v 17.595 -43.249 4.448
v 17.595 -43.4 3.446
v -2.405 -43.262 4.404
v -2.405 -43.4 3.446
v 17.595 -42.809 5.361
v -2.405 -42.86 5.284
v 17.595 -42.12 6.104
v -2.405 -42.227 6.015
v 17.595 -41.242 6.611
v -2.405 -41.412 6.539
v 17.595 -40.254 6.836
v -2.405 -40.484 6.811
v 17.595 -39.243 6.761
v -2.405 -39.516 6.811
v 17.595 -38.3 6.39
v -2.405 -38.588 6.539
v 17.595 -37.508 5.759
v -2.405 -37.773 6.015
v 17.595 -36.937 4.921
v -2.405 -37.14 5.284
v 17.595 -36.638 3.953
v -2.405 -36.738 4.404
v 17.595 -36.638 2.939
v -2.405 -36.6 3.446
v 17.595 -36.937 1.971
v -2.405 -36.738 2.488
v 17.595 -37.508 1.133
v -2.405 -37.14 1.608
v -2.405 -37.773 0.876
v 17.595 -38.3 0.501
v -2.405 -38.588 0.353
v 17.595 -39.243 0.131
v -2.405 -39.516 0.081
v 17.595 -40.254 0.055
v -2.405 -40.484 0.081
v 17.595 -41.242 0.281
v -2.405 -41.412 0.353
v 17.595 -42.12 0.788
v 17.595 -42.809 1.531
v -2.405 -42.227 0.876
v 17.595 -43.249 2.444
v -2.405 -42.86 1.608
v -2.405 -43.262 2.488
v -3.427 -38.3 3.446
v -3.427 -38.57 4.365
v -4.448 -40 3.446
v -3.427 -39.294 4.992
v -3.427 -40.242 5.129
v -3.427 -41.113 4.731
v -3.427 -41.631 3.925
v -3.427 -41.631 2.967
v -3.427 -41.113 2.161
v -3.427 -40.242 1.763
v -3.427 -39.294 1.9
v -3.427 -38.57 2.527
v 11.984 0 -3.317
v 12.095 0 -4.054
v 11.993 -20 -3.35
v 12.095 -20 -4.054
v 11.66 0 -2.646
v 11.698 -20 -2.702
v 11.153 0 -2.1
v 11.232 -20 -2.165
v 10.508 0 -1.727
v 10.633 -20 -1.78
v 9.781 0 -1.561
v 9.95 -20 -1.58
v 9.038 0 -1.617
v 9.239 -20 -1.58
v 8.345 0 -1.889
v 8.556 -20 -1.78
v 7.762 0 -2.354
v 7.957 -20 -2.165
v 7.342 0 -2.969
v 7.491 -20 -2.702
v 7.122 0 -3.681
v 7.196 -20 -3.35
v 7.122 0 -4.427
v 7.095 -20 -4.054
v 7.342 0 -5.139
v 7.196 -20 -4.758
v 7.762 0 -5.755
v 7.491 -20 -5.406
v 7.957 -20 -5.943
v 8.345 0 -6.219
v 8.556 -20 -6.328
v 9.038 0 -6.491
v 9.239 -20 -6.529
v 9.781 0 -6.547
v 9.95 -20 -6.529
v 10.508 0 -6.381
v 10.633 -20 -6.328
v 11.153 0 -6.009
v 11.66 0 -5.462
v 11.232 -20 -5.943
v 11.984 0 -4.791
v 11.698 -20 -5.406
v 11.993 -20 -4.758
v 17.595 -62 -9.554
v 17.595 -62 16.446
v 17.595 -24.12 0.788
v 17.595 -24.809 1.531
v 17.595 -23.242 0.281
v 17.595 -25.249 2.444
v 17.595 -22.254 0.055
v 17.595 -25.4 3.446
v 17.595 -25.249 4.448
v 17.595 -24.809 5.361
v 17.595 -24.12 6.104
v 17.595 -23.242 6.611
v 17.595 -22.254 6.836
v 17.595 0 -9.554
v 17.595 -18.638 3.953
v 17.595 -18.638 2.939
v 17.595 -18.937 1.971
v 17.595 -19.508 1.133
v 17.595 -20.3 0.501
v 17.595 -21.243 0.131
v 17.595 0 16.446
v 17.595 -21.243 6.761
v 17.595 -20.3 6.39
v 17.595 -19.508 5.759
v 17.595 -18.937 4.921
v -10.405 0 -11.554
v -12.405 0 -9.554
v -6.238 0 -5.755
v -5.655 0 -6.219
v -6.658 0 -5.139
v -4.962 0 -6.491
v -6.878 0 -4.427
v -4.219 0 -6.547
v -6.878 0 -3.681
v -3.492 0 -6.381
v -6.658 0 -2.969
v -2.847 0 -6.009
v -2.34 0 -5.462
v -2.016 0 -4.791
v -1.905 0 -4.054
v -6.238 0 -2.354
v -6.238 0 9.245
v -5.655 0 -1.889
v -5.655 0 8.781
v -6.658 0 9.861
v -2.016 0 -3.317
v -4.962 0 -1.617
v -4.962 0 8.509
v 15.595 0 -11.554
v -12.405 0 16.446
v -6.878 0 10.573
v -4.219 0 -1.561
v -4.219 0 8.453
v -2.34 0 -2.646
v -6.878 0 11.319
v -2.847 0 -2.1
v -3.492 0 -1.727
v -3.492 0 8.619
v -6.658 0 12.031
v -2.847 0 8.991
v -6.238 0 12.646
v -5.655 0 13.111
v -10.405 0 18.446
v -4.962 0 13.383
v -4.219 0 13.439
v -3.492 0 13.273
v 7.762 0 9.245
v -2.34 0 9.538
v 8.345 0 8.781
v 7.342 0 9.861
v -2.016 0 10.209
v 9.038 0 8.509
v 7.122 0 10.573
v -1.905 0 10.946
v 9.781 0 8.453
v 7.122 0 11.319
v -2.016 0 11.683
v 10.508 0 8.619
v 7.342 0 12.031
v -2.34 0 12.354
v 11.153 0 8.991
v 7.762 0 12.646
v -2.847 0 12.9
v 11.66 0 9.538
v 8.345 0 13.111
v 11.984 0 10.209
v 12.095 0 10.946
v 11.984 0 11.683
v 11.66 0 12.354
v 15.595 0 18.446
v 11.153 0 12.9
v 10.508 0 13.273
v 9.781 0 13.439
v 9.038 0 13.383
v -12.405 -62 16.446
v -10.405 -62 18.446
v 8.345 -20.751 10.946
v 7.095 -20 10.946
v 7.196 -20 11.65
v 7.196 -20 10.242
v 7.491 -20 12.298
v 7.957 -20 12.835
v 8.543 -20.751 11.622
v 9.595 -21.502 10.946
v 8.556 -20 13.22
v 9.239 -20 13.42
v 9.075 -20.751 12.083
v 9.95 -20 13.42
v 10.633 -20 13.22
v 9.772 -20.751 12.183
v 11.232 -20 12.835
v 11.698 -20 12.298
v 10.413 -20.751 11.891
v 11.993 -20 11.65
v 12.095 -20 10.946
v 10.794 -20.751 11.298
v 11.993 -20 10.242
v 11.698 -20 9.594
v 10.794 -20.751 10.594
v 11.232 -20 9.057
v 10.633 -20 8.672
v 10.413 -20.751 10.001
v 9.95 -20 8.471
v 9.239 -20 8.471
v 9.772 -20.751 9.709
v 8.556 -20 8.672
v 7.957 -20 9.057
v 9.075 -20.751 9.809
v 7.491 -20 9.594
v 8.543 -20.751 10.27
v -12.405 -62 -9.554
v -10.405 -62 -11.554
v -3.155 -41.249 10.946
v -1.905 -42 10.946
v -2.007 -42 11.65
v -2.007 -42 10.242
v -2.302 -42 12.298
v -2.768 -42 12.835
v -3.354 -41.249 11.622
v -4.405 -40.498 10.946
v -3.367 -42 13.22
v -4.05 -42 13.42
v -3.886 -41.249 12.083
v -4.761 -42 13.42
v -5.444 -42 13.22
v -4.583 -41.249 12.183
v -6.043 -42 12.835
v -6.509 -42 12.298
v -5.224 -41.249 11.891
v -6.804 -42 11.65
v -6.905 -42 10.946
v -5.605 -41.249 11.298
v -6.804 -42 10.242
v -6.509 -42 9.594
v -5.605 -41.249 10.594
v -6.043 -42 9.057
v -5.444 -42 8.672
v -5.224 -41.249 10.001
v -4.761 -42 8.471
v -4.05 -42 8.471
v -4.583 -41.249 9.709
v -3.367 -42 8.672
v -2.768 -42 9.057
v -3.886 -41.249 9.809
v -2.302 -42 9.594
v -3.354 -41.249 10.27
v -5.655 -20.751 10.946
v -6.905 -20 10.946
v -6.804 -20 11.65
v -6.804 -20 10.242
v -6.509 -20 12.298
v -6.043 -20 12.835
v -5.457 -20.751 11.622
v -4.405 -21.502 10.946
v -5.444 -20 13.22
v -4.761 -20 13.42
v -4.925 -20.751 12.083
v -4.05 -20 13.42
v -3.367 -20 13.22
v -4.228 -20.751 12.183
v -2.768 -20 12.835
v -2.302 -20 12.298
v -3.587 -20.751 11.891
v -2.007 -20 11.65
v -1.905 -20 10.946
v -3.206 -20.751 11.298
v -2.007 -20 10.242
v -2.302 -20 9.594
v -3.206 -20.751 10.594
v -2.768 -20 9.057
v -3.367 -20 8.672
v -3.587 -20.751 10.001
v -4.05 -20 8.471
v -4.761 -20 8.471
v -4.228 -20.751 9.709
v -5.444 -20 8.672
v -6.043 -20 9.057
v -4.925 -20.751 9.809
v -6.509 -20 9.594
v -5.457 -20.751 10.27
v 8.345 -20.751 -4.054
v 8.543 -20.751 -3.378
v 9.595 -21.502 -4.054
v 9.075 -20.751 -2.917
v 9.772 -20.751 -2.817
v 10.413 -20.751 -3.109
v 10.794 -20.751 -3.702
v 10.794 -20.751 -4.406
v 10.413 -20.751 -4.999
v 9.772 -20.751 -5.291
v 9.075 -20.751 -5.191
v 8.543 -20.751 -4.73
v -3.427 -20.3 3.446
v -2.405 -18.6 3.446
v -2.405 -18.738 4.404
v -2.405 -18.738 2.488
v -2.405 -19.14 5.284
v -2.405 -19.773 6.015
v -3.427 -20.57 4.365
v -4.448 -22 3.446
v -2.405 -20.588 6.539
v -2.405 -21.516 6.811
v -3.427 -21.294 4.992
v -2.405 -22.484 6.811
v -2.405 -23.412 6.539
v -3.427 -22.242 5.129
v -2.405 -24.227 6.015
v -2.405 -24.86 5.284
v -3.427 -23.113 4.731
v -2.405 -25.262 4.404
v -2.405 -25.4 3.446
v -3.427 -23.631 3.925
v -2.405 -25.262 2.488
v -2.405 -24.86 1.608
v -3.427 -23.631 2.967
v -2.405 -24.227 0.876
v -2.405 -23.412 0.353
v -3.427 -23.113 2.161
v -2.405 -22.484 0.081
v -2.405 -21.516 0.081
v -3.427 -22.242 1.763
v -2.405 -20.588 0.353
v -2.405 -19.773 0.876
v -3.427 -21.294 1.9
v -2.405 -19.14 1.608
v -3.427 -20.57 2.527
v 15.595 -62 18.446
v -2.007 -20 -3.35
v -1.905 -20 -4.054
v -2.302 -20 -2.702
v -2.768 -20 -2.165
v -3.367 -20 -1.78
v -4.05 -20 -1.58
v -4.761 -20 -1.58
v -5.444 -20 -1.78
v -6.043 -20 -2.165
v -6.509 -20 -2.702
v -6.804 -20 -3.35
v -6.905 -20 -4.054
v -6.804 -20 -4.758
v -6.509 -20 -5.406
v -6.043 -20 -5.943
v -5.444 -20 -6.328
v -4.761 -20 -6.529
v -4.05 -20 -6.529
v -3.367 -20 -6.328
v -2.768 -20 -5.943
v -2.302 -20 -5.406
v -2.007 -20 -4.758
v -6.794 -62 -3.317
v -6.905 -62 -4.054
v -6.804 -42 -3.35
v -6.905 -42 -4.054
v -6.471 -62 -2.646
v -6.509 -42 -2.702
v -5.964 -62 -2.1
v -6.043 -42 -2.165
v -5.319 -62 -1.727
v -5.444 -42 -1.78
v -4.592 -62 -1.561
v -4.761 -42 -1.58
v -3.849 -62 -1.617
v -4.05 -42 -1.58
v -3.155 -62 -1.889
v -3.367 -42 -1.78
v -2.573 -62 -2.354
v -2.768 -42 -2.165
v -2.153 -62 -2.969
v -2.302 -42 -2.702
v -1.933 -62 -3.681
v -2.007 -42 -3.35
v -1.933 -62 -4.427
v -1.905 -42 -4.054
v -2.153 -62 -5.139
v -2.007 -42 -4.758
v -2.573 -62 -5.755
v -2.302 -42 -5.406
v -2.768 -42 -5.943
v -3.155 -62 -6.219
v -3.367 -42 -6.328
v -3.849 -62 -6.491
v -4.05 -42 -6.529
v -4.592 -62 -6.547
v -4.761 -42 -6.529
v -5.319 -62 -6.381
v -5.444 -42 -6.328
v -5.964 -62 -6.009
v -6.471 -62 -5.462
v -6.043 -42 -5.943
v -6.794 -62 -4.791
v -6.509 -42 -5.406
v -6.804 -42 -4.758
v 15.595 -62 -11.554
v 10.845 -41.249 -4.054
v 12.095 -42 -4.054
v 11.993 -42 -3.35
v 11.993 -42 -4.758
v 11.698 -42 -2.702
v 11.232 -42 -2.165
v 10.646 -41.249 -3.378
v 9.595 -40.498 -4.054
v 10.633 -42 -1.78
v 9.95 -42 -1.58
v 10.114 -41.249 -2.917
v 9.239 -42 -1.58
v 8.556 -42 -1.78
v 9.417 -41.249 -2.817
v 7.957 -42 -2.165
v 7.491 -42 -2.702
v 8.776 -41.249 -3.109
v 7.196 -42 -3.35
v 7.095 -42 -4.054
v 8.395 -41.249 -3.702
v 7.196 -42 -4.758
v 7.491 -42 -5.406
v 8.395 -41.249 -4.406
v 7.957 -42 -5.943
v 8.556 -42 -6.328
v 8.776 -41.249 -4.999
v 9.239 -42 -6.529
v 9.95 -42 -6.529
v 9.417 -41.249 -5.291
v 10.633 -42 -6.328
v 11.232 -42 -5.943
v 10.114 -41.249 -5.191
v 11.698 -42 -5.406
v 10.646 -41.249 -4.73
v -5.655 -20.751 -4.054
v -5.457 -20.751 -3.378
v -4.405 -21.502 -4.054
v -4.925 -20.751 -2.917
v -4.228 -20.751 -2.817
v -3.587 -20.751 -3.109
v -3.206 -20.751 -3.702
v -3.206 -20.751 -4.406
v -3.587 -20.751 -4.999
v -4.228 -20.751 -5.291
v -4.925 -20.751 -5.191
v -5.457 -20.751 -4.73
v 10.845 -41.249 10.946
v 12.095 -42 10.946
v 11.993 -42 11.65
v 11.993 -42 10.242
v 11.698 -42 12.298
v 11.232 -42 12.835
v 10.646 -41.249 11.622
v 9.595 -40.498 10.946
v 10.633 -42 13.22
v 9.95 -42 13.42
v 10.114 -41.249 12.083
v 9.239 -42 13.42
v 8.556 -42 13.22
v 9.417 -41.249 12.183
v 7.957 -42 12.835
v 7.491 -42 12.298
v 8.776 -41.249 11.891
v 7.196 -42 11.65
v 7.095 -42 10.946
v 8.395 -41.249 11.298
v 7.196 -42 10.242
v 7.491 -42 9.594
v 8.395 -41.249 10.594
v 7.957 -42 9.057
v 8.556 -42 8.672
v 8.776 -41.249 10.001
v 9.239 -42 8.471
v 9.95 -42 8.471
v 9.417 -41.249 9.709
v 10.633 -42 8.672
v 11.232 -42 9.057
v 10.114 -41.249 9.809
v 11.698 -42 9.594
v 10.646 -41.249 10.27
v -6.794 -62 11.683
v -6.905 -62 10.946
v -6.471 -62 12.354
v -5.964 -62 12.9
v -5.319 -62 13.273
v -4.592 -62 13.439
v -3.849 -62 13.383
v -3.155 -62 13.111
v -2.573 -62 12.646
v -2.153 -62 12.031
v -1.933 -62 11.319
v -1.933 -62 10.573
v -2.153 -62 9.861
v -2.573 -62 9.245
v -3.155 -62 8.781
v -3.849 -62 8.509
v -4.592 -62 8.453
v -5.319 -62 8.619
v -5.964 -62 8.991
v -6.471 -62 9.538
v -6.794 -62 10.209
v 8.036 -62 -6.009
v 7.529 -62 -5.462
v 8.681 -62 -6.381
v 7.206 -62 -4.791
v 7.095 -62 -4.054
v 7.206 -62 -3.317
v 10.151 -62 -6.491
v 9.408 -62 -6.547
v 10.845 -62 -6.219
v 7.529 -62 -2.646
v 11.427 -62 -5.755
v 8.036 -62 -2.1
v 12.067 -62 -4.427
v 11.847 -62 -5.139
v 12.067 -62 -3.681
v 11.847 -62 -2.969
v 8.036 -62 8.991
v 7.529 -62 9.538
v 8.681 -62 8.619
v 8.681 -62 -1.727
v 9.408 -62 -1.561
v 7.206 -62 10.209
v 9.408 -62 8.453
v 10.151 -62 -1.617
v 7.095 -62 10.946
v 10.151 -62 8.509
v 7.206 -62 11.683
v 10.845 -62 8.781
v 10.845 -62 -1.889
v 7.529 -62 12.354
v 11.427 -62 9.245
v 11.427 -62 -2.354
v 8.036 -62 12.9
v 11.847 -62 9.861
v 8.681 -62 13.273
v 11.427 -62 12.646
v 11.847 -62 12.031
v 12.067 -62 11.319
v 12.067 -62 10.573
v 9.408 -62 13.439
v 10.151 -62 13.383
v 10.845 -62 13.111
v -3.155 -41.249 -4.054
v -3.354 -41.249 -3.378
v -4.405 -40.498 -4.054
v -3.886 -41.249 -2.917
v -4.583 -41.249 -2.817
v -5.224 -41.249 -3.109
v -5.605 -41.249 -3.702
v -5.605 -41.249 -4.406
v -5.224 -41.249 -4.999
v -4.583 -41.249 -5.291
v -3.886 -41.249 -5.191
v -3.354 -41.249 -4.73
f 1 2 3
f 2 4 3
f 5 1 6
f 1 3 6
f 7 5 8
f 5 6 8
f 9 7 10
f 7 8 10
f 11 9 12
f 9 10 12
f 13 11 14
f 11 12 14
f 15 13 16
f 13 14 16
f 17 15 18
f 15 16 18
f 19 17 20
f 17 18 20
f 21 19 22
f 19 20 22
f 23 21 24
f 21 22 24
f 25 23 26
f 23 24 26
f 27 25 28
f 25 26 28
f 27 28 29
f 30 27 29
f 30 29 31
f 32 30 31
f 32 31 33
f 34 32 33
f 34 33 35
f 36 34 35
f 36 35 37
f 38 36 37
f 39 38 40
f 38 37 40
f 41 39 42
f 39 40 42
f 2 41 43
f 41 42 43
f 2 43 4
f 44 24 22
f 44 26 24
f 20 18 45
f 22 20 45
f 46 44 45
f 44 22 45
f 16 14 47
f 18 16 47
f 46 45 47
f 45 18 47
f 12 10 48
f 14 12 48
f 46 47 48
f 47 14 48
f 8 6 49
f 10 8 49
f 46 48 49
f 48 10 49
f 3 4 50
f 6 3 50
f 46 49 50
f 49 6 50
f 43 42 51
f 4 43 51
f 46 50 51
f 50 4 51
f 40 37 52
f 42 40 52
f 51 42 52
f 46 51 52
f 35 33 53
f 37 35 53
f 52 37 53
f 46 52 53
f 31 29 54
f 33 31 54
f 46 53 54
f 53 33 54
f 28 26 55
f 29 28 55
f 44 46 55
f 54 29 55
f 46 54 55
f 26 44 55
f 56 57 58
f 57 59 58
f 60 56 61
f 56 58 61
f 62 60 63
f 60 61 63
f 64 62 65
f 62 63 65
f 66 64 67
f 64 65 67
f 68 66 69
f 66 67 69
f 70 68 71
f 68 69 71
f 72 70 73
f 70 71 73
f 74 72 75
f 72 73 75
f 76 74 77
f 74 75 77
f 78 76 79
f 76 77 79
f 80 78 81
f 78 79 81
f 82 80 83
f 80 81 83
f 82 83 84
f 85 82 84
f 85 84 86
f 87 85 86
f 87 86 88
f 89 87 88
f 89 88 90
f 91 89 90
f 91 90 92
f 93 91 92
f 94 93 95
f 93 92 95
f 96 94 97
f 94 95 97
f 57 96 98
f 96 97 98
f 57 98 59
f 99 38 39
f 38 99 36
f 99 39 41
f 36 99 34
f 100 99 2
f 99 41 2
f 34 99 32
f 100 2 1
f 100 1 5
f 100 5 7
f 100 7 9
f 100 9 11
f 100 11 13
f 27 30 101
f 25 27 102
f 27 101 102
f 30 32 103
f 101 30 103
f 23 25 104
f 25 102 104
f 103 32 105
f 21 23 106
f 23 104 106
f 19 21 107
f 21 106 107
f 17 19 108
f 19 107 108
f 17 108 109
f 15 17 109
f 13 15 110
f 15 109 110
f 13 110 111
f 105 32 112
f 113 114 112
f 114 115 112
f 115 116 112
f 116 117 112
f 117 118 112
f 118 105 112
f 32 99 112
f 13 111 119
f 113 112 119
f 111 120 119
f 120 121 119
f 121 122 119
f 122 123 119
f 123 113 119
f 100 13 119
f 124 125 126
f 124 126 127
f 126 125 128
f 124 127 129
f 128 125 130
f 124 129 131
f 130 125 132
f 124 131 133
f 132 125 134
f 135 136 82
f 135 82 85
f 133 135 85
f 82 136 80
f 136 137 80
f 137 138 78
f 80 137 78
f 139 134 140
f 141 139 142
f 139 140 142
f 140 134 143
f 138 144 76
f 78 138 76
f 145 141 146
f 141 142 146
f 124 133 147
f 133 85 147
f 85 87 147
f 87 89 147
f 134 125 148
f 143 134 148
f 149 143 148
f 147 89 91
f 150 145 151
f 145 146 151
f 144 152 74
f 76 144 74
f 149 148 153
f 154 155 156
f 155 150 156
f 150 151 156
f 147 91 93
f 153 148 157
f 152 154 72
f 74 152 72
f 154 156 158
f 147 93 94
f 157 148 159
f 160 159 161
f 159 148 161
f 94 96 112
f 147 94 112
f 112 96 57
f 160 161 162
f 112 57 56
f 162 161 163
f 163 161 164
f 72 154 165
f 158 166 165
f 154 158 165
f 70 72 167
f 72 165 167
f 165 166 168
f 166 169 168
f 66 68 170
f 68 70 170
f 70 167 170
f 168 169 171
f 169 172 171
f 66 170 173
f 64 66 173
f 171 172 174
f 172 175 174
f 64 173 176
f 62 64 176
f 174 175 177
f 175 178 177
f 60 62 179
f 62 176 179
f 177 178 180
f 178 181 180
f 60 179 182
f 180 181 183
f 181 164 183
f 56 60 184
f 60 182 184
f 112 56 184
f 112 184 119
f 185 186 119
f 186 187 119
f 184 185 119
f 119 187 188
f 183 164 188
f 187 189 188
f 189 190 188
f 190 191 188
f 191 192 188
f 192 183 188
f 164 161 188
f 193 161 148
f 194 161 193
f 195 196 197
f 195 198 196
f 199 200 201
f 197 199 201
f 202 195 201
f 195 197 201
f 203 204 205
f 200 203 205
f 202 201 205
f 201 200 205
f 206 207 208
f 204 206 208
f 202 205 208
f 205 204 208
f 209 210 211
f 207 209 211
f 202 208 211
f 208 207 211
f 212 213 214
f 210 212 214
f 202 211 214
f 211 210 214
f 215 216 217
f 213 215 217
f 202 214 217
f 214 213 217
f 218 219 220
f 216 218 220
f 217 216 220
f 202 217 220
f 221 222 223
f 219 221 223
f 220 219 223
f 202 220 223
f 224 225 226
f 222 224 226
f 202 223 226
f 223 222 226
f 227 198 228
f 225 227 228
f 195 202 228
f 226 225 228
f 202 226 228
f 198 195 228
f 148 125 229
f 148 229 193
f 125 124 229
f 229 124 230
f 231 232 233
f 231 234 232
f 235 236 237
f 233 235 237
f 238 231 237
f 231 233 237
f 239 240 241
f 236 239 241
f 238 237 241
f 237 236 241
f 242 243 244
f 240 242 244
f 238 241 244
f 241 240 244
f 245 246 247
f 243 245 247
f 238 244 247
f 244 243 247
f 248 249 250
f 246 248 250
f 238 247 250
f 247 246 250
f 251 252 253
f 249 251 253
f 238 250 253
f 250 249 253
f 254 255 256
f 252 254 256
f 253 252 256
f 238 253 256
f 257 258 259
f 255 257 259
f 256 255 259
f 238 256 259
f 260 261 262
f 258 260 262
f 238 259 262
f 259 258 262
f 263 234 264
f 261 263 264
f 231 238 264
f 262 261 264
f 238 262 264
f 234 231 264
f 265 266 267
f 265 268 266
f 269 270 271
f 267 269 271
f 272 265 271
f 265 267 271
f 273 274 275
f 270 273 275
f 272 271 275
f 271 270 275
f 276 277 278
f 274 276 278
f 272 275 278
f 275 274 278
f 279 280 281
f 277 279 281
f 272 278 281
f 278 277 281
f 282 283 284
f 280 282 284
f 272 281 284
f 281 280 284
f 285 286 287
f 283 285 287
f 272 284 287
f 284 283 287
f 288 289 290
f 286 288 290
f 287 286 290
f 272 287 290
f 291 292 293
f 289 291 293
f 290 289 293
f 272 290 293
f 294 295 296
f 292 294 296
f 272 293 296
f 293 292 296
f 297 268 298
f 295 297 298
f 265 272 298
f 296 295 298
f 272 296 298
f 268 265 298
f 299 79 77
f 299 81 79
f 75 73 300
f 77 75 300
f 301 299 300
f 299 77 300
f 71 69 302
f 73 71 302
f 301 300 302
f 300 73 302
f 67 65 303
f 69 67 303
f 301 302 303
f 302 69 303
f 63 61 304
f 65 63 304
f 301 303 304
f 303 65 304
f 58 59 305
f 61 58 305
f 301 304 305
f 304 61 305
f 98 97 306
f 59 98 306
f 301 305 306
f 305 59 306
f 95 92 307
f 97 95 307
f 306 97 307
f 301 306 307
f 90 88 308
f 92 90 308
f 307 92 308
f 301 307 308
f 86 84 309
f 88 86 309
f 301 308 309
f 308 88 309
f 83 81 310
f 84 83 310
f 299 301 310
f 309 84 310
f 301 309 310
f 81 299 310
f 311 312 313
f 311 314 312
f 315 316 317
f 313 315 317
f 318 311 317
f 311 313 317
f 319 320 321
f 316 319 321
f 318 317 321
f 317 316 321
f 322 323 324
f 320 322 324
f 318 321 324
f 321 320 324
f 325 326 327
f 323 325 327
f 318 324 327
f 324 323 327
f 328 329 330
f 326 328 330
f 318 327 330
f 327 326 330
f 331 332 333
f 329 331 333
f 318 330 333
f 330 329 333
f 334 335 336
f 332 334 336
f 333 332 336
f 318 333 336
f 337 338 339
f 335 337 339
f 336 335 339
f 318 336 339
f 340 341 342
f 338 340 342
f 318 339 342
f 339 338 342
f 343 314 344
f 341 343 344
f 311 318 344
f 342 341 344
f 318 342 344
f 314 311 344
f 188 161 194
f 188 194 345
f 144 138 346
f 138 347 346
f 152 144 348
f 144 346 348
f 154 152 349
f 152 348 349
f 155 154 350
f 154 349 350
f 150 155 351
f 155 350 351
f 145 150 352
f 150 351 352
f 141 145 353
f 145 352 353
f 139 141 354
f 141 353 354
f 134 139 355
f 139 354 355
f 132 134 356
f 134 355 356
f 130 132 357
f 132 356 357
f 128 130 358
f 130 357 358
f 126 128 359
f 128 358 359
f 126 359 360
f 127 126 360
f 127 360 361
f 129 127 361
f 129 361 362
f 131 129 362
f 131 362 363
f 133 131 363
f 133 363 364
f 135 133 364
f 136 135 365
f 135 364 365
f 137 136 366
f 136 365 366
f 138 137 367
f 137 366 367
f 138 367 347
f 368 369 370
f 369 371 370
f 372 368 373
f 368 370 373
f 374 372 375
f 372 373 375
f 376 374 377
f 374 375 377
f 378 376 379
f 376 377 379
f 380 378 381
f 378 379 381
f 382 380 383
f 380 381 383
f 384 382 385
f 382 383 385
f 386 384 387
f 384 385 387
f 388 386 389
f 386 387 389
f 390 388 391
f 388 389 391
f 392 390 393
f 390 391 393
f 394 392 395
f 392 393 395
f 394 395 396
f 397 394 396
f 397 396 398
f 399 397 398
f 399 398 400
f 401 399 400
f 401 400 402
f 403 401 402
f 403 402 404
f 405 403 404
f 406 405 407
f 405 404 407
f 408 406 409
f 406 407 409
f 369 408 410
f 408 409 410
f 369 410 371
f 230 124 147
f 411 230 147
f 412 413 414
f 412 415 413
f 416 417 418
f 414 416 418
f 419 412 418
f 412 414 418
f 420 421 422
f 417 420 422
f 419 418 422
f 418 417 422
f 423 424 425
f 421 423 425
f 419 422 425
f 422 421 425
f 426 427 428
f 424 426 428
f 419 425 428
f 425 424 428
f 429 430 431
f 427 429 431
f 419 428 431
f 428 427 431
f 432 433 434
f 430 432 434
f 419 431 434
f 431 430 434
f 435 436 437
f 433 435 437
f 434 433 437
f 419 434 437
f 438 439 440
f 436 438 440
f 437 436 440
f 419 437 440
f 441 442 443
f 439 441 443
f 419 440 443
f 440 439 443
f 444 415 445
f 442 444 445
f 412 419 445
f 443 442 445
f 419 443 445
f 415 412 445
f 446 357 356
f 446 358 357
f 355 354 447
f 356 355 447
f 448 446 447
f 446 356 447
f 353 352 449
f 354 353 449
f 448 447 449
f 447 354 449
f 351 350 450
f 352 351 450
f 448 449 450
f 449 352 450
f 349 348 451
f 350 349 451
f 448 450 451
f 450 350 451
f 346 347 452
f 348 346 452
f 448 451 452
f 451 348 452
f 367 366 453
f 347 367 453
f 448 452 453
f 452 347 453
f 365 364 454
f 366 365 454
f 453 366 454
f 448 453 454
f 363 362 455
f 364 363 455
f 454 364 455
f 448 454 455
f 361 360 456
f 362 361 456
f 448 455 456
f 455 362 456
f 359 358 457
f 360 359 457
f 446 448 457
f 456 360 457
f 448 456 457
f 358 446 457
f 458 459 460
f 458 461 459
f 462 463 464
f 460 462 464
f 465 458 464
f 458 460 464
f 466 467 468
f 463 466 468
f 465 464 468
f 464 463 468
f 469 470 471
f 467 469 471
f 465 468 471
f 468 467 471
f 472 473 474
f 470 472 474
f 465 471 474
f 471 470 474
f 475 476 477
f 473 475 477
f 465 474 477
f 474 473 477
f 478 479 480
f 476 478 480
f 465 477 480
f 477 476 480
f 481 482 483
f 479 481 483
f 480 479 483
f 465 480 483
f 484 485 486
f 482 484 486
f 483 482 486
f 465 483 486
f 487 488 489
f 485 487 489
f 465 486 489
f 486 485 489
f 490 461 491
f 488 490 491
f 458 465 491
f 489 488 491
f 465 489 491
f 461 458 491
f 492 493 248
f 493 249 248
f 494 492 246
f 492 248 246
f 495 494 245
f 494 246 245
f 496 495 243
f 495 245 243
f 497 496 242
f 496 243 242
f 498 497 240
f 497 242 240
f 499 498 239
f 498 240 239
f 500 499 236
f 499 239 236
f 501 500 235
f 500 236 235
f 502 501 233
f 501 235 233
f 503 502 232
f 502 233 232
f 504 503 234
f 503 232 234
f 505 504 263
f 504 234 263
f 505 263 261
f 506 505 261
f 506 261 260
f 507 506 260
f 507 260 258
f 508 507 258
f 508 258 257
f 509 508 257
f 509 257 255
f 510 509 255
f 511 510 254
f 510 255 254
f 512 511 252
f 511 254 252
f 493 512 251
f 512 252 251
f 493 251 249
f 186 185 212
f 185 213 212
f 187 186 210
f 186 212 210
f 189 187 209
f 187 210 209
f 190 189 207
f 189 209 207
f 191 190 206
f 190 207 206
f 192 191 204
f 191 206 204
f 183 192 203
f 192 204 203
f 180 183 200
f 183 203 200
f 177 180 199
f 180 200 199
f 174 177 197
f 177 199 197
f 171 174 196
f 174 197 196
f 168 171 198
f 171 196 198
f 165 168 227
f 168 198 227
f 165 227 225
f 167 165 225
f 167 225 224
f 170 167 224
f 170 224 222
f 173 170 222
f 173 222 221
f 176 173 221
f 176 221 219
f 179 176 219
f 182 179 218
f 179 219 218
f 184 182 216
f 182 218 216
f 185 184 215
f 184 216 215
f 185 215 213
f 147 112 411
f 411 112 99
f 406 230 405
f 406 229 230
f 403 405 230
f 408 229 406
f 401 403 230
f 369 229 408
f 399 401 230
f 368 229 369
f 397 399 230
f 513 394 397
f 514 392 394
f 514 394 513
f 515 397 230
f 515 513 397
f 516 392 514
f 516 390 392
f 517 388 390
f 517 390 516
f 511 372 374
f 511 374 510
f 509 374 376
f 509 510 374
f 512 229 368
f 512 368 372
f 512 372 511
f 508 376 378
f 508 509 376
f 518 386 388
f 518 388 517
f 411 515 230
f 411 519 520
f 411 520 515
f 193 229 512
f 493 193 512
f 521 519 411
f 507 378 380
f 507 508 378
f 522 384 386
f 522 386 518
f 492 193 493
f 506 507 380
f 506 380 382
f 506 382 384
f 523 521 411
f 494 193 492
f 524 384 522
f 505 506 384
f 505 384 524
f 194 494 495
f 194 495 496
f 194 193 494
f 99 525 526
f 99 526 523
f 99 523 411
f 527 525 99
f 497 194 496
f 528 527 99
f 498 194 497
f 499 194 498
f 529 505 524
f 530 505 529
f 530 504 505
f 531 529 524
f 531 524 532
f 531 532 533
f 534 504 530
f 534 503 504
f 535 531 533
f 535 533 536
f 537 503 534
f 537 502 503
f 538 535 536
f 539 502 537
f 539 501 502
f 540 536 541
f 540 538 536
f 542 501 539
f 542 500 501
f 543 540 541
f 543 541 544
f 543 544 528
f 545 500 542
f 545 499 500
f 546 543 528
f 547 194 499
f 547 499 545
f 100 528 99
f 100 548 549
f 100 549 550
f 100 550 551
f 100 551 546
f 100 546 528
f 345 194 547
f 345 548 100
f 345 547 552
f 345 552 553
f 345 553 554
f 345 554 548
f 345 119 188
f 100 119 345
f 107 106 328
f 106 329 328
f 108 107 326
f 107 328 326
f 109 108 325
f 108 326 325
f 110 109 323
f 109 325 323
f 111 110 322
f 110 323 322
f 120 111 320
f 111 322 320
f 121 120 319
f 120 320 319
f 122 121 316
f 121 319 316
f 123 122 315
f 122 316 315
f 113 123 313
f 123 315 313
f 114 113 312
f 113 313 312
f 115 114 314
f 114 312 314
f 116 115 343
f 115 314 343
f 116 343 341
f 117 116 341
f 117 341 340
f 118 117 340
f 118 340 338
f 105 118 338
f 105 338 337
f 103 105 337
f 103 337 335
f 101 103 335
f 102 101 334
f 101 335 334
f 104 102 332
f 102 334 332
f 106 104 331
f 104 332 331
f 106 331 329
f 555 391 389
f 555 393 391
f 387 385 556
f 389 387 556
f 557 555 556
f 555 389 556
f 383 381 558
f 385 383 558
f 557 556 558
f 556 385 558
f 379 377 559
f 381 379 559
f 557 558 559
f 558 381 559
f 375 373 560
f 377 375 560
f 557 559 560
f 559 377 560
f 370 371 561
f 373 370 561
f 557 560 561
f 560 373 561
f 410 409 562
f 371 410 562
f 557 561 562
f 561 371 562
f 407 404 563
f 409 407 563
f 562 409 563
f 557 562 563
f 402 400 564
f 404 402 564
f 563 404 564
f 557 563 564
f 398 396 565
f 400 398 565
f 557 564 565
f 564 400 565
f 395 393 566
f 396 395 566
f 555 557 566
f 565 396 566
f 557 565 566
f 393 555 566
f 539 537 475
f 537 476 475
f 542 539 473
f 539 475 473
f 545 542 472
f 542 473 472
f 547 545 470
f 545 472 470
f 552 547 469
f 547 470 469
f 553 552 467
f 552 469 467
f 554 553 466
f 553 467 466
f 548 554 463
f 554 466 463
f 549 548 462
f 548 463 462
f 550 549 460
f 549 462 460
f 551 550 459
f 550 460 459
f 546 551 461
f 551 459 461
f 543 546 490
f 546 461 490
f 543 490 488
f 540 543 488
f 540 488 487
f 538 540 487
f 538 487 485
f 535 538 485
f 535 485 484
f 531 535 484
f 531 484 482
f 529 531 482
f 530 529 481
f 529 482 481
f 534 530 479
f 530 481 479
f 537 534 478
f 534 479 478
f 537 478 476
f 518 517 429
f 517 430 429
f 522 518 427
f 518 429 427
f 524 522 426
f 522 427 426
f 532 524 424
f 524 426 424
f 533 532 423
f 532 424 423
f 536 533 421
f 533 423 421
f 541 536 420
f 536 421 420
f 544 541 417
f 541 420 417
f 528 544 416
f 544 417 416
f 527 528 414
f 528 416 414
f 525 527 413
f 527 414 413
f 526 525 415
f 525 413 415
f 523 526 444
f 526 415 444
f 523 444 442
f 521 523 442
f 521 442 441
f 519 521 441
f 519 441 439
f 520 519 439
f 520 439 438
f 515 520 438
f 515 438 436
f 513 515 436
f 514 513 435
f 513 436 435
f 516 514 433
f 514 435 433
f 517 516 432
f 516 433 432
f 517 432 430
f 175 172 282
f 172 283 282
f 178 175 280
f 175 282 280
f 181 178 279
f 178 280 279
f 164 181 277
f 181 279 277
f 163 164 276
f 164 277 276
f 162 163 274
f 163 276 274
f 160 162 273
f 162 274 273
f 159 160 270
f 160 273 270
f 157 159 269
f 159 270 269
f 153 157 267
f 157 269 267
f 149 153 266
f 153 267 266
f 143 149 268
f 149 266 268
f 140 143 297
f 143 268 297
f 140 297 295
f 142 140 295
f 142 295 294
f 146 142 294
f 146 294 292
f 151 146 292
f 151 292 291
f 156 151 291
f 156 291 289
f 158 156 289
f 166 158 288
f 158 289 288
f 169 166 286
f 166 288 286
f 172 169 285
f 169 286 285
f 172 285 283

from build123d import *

# Parameters (mm, degrees)
F0_W     = 30
F0_H     = 30
F1_DEPTH = 62
F3_D     = 5
F3_DEPTH = 20
F3_TIP   = 1.5021515476
F5_D     = 6.8
F5_DEPTH = 20
F5_TIP   = 2.0429261047
F7_D     = 5
F7_DEPTH = 20
F7_TIP   = 1.5021515476
F8_SIZE  = 2


with BuildPart() as f1:
    # F0 (on Front) → F1 (new body)
    with BuildSketch(Plane.XZ):
        with Locations((2.5945728272, 3.4459190071)):
            Rectangle(F0_W, F0_H)
    extrude(amount=F1_DEPTH)

    # F3
    with Locations(Plane.XZ.offset(62)):
        with Locations((-4.4054271728, 10.9459190071), (9.5945728272, 10.9459190071), (9.5945728272, -4.0540809929), (-4.4054271728, -4.0540809929)):
            Hole(F3_D / 2, depth=F3_DEPTH)
            with Locations((0, 0, -(F3_DEPTH + F3_TIP / 2))):  # 118° drill point
                Cone(0, F3_D / 2, F3_TIP, mode=Mode.SUBTRACT)

    # F5
    with Locations(Plane.YZ.offset(17.5945728272)):
        with Locations((-40, 3.4459190071), (-22, 3.4459190071)):
            Hole(F5_D / 2, depth=F5_DEPTH)
            with Locations((0, 0, -(F5_DEPTH + F5_TIP / 2))):  # 118° drill point
                Cone(0, F5_D / 2, F5_TIP, mode=Mode.SUBTRACT)

    # F7
    with Locations(Plane(origin=(0, 0, 0), x_dir=(-1, 0, 0), z_dir=(0, 1, 0))):
        with Locations((-9.5945728272, 10.9459190071), (4.4054271728, 10.9459190071), (4.4054271728, -4.0540809929), (-9.5945728272, -4.0540809929)):
            Hole(F7_D / 2, depth=F7_DEPTH)
            with Locations((0, 0, -(F7_DEPTH + F7_TIP / 2))):  # 118° drill point
                Cone(0, F7_D / 2, F7_TIP, mode=Mode.SUBTRACT)

    # F8
    f8_edges = [f1.edges().sort_by_distance(p)[0] for p in [
        (-12.405427, -31, 18.445919),
        (17.594573, -31, 18.445919),
        (17.594573, -31, -11.554081),
        (-12.405427, -31, -11.554081),
    ]]
    chamfer(f8_edges, length=F8_SIZE)


solid = f1.part
